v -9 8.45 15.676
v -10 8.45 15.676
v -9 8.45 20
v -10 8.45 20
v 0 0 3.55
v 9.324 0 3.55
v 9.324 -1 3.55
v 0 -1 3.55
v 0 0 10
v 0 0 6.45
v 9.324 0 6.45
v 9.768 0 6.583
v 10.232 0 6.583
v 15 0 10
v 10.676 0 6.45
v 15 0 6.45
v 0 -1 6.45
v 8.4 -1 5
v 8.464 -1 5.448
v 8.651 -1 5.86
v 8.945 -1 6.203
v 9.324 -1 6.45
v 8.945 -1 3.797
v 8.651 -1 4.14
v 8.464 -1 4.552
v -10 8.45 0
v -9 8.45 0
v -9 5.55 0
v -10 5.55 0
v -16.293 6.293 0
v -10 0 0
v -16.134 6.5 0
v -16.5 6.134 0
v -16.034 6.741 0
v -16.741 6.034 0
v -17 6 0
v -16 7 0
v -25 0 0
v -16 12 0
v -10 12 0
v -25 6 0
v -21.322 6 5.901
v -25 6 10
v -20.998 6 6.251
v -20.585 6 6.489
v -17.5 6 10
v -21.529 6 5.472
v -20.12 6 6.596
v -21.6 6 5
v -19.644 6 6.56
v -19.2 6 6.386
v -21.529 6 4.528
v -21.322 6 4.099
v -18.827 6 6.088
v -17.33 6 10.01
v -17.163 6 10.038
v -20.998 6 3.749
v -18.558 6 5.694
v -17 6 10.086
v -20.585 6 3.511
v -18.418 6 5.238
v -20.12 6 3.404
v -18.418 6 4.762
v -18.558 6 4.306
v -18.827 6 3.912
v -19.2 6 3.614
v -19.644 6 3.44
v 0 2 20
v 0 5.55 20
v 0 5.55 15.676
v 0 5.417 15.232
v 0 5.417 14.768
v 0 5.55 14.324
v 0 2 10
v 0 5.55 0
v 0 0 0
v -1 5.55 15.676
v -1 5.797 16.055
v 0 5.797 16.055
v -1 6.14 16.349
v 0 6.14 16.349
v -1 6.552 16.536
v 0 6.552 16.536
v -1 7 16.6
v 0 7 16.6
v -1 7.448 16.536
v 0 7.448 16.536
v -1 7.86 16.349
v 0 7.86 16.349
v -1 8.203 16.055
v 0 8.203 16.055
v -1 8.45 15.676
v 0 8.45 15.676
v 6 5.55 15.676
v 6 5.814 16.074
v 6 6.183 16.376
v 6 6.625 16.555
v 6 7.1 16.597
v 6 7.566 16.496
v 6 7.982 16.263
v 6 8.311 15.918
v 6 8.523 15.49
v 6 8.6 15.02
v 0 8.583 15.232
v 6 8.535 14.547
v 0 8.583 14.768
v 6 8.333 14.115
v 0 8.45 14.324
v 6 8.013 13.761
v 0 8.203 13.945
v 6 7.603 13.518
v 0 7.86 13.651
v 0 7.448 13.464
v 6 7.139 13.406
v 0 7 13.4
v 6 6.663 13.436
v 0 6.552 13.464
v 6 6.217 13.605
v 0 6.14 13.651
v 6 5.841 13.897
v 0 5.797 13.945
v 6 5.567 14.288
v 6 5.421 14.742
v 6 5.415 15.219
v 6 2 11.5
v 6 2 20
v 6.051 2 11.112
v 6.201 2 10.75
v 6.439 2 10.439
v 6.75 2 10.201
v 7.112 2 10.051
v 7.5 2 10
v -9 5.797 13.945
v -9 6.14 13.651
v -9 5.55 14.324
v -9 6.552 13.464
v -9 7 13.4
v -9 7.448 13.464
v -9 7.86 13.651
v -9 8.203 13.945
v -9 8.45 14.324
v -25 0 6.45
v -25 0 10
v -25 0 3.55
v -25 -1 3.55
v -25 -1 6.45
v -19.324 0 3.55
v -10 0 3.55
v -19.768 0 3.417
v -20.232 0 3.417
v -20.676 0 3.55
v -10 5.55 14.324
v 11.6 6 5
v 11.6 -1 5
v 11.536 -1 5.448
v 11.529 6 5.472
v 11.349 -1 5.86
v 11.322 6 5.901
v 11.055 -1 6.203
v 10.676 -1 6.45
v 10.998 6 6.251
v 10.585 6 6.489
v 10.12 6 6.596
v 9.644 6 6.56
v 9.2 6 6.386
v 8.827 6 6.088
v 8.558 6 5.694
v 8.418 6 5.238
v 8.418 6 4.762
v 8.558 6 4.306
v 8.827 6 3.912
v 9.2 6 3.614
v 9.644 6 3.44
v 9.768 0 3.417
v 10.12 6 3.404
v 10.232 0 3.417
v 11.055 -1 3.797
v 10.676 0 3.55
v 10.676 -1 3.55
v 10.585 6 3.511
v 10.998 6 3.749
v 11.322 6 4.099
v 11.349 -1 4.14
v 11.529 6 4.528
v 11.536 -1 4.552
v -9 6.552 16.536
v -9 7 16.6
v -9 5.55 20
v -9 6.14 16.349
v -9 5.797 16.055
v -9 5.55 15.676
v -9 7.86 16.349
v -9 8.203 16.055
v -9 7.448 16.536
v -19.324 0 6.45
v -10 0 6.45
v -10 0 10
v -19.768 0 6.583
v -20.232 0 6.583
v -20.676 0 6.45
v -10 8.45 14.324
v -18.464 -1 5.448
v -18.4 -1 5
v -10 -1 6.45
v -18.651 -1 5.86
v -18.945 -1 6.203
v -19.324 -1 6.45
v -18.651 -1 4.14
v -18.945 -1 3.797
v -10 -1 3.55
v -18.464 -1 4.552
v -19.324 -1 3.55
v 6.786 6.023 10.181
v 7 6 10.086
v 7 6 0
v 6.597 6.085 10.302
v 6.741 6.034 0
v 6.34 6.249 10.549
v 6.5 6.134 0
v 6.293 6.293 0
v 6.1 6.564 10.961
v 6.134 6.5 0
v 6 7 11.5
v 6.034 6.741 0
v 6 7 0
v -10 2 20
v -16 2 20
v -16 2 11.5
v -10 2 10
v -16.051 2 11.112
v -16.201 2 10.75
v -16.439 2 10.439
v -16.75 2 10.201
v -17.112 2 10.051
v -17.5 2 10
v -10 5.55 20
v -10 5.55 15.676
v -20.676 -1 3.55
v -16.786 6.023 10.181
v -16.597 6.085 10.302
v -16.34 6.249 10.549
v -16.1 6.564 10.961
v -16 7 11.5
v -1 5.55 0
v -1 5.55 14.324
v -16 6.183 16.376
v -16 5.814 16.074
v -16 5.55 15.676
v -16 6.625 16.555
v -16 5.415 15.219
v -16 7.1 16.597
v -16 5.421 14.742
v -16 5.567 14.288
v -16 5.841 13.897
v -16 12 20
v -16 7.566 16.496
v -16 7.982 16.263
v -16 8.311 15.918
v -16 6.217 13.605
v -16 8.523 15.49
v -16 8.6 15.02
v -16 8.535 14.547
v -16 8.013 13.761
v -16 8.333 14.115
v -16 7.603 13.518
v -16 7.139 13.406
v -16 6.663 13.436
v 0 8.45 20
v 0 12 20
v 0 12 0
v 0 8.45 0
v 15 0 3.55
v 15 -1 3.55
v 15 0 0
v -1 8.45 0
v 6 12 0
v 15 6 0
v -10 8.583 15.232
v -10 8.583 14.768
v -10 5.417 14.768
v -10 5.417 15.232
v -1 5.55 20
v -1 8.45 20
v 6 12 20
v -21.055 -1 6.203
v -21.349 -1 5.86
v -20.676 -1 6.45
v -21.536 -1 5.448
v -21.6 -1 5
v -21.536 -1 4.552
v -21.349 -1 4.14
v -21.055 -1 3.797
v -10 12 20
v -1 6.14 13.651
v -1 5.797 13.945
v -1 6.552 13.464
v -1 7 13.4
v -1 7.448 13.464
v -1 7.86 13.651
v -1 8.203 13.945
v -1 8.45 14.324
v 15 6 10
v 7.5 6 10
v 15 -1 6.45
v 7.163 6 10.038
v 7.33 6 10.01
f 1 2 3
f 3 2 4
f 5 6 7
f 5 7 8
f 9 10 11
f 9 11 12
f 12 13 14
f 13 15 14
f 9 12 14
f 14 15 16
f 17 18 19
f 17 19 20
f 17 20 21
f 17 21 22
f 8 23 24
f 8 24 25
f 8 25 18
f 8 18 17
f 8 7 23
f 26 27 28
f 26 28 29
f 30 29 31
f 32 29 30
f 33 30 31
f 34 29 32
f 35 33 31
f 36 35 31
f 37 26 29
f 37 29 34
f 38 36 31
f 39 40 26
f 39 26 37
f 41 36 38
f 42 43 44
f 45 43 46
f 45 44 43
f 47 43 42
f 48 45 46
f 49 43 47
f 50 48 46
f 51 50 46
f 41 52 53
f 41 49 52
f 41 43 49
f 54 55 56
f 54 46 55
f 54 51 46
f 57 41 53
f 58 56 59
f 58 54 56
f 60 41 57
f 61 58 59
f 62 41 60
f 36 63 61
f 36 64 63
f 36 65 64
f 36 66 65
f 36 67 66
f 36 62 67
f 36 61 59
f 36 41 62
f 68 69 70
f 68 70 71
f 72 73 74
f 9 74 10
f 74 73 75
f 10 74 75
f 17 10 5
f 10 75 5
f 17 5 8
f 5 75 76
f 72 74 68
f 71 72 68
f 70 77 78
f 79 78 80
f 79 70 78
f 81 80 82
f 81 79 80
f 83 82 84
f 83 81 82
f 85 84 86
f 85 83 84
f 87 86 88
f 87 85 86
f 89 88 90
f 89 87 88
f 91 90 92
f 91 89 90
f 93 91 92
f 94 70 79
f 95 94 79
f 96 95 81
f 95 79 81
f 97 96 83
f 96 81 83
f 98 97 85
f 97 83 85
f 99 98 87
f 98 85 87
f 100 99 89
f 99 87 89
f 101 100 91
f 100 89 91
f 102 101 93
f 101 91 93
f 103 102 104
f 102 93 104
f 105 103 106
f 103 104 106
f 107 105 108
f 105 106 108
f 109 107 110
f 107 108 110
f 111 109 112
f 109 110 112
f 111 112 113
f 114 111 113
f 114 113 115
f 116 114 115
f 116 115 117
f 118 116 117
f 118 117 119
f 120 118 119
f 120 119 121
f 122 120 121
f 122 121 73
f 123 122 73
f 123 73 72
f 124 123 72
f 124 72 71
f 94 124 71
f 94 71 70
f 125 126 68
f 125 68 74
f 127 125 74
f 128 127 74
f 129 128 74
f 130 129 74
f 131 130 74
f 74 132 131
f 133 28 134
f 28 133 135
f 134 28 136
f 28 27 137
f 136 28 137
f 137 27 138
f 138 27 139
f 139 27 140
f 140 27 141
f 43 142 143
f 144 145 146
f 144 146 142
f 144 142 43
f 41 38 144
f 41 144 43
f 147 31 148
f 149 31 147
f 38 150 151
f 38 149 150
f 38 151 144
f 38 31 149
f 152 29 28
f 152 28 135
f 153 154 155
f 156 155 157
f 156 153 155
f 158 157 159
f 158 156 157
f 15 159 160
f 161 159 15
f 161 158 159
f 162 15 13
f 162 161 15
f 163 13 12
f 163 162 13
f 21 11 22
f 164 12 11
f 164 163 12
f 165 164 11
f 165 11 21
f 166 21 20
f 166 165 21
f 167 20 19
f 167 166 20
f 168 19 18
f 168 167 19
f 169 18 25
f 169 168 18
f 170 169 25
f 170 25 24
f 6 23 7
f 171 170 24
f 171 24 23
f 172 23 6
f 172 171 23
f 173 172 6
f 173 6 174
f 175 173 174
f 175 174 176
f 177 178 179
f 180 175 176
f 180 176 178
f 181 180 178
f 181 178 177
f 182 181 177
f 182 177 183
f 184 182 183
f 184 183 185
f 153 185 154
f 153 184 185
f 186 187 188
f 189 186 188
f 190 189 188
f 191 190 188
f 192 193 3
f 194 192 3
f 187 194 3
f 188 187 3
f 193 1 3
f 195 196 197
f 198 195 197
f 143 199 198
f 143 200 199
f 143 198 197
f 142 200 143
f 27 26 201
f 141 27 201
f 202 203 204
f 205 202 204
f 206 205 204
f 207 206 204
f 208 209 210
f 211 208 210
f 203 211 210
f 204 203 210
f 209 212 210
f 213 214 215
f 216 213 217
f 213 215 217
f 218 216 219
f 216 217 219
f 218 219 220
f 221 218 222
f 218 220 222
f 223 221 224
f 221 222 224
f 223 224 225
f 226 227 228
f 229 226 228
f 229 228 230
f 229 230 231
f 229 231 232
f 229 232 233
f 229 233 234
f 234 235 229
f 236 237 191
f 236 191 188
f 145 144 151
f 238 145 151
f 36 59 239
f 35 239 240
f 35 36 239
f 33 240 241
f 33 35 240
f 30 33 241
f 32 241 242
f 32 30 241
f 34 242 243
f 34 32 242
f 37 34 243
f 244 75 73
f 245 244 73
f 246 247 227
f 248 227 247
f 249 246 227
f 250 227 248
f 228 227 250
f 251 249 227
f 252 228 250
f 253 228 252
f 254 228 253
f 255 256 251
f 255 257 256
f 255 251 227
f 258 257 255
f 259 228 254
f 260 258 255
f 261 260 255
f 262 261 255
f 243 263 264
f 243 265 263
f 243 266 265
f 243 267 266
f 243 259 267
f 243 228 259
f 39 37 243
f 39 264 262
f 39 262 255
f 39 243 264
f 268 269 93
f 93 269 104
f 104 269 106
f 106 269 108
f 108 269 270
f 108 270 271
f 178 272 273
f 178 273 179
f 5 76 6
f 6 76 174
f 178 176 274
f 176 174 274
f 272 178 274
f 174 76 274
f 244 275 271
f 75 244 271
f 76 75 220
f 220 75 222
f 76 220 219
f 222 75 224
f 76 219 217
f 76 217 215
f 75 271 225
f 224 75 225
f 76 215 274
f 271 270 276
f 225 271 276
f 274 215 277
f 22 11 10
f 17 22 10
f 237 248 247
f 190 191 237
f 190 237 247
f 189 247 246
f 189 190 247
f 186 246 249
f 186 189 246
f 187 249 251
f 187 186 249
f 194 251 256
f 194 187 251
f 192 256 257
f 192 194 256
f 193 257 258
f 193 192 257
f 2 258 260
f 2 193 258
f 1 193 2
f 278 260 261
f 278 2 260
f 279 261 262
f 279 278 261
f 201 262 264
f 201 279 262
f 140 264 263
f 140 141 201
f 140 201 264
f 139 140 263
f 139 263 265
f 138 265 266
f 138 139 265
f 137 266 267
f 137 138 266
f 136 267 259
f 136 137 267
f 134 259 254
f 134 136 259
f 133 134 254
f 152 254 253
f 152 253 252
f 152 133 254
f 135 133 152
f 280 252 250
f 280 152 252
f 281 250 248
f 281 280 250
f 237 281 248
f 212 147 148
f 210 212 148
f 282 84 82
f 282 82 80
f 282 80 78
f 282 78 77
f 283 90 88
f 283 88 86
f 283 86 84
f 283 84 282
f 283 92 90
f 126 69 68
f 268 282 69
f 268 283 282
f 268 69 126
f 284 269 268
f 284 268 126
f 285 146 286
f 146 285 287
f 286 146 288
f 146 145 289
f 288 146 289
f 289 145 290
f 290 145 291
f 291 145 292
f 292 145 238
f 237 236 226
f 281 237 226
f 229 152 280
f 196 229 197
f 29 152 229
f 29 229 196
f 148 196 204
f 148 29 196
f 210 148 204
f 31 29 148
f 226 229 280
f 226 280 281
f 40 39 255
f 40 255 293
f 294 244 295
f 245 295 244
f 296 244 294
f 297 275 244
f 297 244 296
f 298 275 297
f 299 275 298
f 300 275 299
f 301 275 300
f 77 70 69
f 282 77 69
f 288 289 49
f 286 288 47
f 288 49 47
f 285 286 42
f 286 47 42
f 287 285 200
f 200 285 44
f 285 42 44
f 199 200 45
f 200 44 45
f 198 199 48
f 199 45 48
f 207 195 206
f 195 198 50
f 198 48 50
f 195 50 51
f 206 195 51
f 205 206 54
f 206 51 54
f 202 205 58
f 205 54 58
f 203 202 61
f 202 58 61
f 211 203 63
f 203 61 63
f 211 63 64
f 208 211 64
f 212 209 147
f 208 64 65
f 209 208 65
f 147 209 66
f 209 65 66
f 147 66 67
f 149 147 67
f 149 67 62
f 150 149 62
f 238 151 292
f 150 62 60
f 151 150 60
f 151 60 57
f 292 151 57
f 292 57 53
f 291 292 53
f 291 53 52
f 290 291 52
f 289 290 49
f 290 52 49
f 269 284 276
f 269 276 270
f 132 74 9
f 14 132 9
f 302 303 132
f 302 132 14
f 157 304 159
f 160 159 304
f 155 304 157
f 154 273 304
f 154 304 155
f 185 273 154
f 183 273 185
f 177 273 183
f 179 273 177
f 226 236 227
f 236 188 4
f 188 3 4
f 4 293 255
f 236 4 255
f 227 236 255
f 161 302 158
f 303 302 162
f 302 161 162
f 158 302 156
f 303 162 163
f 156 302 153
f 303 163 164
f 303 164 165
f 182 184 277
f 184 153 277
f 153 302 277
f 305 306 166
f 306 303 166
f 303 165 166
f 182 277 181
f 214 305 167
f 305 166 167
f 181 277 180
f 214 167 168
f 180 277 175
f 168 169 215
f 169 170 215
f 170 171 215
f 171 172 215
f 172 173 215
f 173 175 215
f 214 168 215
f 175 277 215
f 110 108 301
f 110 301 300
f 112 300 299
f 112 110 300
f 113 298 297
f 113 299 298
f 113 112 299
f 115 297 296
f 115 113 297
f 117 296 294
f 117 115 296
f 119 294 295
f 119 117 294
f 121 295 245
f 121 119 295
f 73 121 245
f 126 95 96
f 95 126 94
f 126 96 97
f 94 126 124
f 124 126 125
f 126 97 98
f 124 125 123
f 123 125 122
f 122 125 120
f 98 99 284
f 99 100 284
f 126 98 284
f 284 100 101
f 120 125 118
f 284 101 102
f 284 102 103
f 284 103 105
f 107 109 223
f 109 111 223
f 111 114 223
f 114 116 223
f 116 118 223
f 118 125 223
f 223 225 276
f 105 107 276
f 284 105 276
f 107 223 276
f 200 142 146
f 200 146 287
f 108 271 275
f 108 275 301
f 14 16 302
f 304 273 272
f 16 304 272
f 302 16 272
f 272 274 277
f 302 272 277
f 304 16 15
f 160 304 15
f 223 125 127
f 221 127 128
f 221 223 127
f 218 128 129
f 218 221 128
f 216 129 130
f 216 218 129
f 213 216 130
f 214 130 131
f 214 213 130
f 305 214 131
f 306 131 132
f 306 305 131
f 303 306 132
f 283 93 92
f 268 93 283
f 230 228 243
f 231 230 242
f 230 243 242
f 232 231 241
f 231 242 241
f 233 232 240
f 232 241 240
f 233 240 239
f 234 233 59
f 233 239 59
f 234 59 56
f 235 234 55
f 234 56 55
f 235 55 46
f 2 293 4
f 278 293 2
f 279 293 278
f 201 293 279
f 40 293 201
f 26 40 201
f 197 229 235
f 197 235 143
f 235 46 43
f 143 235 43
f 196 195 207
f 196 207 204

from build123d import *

# Parameters (mm, degrees)
MAIN_DEPTH                   = 20
ESQUISSE4_W                  = 20
ESQUISSE4_H                  = 2.9
VERTICALGUIDANCE_DEPTH       = 1
VERTICALHOLE_DEPTH           = 28.730849248
VERTICALHOLE_DEPTH_BACK      = 28.730849248
ESQUISSE2_R                  = 1.6
ESQUISSE5_W                  = 15
ESQUISSE5_H                  = 2.9
HORIZONTALGUIDANCE_DEPTH     = 1
HORIZONTALHOLE_DEPTH         = 26.961510106
HORIZONTALHOLE_DEPTH_BACK    = 26.961510106
ESQUISSE3_R                  = 1.6
ENL_V_MAT_EXTRU_4_DEPTH      = 26.961510106
ENL_V_MAT_EXTRU_4_DEPTH_BACK = 26.961510106
ESQUISSE9_W                  = 9
ESQUISSE9_H                  = 10
SKETCH1_W                    = 10
SKETCH1_H                    = 2
CUT_EXTRUDE1_DEPTH           = 29.284271247
CONG_2_R                     = 1.5


with BuildPart() as part:
    # Esquisse1 → Main (new body)
    with BuildSketch(Plane.XY):
        with BuildLine():
            Line((0, 0), (15, 0))
            Line((15, 0), (15, 6))
            Line((15, 6), (7, 6))
            ThreePointArc((7, 6), (6.292893219, 6.292893219), (6, 7))
            Line((6, 7), (6, 12))
            Line((6, 12), (0, 12))
            Line((0, 12), (0, 0))
        make_face()
    extrude(amount=MAIN_DEPTH)

    # Esquisse4 → VerticalGuidance (add)
    with BuildSketch(Plane.ZY):
        with Locations((10, 7)):
            Rectangle(ESQUISSE4_W, ESQUISSE4_H)
    extrude(amount=VERTICALGUIDANCE_DEPTH)

    # Esquisse2 → VerticalHole (cut, two sides: drawn at the far end of the back side and taken through both)
    with BuildSketch(Plane.ZY.offset(-VERTICALHOLE_DEPTH_BACK)):
        with Locations((15, 7)):
            Circle(ESQUISSE2_R)
    extrude(amount=VERTICALHOLE_DEPTH + VERTICALHOLE_DEPTH_BACK, mode=Mode.SUBTRACT)

    # Esquisse5 → HorizontalGuidance (add)
    with BuildSketch(Plane(origin=(0, 0, 0), x_dir=(-1, 0, 0), z_dir=(0, -1, 0))):
        with Locations((-7.5, -5)):
            Rectangle(ESQUISSE5_W, ESQUISSE5_H)
    extrude(amount=HORIZONTALGUIDANCE_DEPTH)

    # Esquisse3 → HorizontalHole (cut, two sides: drawn at the far end of the back side and taken through both)
    with BuildSketch(Plane.XZ.offset(-6).offset(-HORIZONTALHOLE_DEPTH_BACK)):
        with Locations((10, 5)):
            Circle(ESQUISSE3_R)
    extrude(amount=HORIZONTALHOLE_DEPTH + HORIZONTALHOLE_DEPTH_BACK, mode=Mode.SUBTRACT)

    # Esquisse9 → Enlèv. mat.-Extru.4 (cut, two sides: drawn at the far end of the back side and taken through both)
    with BuildSketch(Plane(origin=(0, 6, 0), x_dir=(1, 0, 0), z_dir=(0, 1, 0)).offset(-ENL_V_MAT_EXTRU_4_DEPTH_BACK)):
        with Locations((10.5, -15)):
            Rectangle(ESQUISSE9_W, ESQUISSE9_H)
    extrude(amount=ENL_V_MAT_EXTRU_4_DEPTH + ENL_V_MAT_EXTRU_4_DEPTH_BACK, mode=Mode.SUBTRACT)

    # Sketch1 → Cut-Extrude1 (cut, through all)
    with BuildSketch(Plane(origin=(15, 0, 0), x_dir=(0, 0, -1), z_dir=(1, 0, 0))):
        with Locations((-15, 1)):
            Rectangle(SKETCH1_W, SKETCH1_H)
    extrude(amount=-CUT_EXTRUDE1_DEPTH, mode=Mode.SUBTRACT)

    # Congé2
    cong_2_edges = [part.edges().sort_by_distance(p)[0] for p in [
        (6, 4.5, 10),
    ]]
    fillet(cong_2_edges, radius=CONG_2_R)


with BuildPart() as body_2:
    # Mirror1: mirrored copy
    add(part.part.mirror(Plane(origin=(-5, 0, 0), x_dir=(0, 0, 1), z_dir=(1, 0, 0))))


solid = Compound([part.part, body_2.part])
